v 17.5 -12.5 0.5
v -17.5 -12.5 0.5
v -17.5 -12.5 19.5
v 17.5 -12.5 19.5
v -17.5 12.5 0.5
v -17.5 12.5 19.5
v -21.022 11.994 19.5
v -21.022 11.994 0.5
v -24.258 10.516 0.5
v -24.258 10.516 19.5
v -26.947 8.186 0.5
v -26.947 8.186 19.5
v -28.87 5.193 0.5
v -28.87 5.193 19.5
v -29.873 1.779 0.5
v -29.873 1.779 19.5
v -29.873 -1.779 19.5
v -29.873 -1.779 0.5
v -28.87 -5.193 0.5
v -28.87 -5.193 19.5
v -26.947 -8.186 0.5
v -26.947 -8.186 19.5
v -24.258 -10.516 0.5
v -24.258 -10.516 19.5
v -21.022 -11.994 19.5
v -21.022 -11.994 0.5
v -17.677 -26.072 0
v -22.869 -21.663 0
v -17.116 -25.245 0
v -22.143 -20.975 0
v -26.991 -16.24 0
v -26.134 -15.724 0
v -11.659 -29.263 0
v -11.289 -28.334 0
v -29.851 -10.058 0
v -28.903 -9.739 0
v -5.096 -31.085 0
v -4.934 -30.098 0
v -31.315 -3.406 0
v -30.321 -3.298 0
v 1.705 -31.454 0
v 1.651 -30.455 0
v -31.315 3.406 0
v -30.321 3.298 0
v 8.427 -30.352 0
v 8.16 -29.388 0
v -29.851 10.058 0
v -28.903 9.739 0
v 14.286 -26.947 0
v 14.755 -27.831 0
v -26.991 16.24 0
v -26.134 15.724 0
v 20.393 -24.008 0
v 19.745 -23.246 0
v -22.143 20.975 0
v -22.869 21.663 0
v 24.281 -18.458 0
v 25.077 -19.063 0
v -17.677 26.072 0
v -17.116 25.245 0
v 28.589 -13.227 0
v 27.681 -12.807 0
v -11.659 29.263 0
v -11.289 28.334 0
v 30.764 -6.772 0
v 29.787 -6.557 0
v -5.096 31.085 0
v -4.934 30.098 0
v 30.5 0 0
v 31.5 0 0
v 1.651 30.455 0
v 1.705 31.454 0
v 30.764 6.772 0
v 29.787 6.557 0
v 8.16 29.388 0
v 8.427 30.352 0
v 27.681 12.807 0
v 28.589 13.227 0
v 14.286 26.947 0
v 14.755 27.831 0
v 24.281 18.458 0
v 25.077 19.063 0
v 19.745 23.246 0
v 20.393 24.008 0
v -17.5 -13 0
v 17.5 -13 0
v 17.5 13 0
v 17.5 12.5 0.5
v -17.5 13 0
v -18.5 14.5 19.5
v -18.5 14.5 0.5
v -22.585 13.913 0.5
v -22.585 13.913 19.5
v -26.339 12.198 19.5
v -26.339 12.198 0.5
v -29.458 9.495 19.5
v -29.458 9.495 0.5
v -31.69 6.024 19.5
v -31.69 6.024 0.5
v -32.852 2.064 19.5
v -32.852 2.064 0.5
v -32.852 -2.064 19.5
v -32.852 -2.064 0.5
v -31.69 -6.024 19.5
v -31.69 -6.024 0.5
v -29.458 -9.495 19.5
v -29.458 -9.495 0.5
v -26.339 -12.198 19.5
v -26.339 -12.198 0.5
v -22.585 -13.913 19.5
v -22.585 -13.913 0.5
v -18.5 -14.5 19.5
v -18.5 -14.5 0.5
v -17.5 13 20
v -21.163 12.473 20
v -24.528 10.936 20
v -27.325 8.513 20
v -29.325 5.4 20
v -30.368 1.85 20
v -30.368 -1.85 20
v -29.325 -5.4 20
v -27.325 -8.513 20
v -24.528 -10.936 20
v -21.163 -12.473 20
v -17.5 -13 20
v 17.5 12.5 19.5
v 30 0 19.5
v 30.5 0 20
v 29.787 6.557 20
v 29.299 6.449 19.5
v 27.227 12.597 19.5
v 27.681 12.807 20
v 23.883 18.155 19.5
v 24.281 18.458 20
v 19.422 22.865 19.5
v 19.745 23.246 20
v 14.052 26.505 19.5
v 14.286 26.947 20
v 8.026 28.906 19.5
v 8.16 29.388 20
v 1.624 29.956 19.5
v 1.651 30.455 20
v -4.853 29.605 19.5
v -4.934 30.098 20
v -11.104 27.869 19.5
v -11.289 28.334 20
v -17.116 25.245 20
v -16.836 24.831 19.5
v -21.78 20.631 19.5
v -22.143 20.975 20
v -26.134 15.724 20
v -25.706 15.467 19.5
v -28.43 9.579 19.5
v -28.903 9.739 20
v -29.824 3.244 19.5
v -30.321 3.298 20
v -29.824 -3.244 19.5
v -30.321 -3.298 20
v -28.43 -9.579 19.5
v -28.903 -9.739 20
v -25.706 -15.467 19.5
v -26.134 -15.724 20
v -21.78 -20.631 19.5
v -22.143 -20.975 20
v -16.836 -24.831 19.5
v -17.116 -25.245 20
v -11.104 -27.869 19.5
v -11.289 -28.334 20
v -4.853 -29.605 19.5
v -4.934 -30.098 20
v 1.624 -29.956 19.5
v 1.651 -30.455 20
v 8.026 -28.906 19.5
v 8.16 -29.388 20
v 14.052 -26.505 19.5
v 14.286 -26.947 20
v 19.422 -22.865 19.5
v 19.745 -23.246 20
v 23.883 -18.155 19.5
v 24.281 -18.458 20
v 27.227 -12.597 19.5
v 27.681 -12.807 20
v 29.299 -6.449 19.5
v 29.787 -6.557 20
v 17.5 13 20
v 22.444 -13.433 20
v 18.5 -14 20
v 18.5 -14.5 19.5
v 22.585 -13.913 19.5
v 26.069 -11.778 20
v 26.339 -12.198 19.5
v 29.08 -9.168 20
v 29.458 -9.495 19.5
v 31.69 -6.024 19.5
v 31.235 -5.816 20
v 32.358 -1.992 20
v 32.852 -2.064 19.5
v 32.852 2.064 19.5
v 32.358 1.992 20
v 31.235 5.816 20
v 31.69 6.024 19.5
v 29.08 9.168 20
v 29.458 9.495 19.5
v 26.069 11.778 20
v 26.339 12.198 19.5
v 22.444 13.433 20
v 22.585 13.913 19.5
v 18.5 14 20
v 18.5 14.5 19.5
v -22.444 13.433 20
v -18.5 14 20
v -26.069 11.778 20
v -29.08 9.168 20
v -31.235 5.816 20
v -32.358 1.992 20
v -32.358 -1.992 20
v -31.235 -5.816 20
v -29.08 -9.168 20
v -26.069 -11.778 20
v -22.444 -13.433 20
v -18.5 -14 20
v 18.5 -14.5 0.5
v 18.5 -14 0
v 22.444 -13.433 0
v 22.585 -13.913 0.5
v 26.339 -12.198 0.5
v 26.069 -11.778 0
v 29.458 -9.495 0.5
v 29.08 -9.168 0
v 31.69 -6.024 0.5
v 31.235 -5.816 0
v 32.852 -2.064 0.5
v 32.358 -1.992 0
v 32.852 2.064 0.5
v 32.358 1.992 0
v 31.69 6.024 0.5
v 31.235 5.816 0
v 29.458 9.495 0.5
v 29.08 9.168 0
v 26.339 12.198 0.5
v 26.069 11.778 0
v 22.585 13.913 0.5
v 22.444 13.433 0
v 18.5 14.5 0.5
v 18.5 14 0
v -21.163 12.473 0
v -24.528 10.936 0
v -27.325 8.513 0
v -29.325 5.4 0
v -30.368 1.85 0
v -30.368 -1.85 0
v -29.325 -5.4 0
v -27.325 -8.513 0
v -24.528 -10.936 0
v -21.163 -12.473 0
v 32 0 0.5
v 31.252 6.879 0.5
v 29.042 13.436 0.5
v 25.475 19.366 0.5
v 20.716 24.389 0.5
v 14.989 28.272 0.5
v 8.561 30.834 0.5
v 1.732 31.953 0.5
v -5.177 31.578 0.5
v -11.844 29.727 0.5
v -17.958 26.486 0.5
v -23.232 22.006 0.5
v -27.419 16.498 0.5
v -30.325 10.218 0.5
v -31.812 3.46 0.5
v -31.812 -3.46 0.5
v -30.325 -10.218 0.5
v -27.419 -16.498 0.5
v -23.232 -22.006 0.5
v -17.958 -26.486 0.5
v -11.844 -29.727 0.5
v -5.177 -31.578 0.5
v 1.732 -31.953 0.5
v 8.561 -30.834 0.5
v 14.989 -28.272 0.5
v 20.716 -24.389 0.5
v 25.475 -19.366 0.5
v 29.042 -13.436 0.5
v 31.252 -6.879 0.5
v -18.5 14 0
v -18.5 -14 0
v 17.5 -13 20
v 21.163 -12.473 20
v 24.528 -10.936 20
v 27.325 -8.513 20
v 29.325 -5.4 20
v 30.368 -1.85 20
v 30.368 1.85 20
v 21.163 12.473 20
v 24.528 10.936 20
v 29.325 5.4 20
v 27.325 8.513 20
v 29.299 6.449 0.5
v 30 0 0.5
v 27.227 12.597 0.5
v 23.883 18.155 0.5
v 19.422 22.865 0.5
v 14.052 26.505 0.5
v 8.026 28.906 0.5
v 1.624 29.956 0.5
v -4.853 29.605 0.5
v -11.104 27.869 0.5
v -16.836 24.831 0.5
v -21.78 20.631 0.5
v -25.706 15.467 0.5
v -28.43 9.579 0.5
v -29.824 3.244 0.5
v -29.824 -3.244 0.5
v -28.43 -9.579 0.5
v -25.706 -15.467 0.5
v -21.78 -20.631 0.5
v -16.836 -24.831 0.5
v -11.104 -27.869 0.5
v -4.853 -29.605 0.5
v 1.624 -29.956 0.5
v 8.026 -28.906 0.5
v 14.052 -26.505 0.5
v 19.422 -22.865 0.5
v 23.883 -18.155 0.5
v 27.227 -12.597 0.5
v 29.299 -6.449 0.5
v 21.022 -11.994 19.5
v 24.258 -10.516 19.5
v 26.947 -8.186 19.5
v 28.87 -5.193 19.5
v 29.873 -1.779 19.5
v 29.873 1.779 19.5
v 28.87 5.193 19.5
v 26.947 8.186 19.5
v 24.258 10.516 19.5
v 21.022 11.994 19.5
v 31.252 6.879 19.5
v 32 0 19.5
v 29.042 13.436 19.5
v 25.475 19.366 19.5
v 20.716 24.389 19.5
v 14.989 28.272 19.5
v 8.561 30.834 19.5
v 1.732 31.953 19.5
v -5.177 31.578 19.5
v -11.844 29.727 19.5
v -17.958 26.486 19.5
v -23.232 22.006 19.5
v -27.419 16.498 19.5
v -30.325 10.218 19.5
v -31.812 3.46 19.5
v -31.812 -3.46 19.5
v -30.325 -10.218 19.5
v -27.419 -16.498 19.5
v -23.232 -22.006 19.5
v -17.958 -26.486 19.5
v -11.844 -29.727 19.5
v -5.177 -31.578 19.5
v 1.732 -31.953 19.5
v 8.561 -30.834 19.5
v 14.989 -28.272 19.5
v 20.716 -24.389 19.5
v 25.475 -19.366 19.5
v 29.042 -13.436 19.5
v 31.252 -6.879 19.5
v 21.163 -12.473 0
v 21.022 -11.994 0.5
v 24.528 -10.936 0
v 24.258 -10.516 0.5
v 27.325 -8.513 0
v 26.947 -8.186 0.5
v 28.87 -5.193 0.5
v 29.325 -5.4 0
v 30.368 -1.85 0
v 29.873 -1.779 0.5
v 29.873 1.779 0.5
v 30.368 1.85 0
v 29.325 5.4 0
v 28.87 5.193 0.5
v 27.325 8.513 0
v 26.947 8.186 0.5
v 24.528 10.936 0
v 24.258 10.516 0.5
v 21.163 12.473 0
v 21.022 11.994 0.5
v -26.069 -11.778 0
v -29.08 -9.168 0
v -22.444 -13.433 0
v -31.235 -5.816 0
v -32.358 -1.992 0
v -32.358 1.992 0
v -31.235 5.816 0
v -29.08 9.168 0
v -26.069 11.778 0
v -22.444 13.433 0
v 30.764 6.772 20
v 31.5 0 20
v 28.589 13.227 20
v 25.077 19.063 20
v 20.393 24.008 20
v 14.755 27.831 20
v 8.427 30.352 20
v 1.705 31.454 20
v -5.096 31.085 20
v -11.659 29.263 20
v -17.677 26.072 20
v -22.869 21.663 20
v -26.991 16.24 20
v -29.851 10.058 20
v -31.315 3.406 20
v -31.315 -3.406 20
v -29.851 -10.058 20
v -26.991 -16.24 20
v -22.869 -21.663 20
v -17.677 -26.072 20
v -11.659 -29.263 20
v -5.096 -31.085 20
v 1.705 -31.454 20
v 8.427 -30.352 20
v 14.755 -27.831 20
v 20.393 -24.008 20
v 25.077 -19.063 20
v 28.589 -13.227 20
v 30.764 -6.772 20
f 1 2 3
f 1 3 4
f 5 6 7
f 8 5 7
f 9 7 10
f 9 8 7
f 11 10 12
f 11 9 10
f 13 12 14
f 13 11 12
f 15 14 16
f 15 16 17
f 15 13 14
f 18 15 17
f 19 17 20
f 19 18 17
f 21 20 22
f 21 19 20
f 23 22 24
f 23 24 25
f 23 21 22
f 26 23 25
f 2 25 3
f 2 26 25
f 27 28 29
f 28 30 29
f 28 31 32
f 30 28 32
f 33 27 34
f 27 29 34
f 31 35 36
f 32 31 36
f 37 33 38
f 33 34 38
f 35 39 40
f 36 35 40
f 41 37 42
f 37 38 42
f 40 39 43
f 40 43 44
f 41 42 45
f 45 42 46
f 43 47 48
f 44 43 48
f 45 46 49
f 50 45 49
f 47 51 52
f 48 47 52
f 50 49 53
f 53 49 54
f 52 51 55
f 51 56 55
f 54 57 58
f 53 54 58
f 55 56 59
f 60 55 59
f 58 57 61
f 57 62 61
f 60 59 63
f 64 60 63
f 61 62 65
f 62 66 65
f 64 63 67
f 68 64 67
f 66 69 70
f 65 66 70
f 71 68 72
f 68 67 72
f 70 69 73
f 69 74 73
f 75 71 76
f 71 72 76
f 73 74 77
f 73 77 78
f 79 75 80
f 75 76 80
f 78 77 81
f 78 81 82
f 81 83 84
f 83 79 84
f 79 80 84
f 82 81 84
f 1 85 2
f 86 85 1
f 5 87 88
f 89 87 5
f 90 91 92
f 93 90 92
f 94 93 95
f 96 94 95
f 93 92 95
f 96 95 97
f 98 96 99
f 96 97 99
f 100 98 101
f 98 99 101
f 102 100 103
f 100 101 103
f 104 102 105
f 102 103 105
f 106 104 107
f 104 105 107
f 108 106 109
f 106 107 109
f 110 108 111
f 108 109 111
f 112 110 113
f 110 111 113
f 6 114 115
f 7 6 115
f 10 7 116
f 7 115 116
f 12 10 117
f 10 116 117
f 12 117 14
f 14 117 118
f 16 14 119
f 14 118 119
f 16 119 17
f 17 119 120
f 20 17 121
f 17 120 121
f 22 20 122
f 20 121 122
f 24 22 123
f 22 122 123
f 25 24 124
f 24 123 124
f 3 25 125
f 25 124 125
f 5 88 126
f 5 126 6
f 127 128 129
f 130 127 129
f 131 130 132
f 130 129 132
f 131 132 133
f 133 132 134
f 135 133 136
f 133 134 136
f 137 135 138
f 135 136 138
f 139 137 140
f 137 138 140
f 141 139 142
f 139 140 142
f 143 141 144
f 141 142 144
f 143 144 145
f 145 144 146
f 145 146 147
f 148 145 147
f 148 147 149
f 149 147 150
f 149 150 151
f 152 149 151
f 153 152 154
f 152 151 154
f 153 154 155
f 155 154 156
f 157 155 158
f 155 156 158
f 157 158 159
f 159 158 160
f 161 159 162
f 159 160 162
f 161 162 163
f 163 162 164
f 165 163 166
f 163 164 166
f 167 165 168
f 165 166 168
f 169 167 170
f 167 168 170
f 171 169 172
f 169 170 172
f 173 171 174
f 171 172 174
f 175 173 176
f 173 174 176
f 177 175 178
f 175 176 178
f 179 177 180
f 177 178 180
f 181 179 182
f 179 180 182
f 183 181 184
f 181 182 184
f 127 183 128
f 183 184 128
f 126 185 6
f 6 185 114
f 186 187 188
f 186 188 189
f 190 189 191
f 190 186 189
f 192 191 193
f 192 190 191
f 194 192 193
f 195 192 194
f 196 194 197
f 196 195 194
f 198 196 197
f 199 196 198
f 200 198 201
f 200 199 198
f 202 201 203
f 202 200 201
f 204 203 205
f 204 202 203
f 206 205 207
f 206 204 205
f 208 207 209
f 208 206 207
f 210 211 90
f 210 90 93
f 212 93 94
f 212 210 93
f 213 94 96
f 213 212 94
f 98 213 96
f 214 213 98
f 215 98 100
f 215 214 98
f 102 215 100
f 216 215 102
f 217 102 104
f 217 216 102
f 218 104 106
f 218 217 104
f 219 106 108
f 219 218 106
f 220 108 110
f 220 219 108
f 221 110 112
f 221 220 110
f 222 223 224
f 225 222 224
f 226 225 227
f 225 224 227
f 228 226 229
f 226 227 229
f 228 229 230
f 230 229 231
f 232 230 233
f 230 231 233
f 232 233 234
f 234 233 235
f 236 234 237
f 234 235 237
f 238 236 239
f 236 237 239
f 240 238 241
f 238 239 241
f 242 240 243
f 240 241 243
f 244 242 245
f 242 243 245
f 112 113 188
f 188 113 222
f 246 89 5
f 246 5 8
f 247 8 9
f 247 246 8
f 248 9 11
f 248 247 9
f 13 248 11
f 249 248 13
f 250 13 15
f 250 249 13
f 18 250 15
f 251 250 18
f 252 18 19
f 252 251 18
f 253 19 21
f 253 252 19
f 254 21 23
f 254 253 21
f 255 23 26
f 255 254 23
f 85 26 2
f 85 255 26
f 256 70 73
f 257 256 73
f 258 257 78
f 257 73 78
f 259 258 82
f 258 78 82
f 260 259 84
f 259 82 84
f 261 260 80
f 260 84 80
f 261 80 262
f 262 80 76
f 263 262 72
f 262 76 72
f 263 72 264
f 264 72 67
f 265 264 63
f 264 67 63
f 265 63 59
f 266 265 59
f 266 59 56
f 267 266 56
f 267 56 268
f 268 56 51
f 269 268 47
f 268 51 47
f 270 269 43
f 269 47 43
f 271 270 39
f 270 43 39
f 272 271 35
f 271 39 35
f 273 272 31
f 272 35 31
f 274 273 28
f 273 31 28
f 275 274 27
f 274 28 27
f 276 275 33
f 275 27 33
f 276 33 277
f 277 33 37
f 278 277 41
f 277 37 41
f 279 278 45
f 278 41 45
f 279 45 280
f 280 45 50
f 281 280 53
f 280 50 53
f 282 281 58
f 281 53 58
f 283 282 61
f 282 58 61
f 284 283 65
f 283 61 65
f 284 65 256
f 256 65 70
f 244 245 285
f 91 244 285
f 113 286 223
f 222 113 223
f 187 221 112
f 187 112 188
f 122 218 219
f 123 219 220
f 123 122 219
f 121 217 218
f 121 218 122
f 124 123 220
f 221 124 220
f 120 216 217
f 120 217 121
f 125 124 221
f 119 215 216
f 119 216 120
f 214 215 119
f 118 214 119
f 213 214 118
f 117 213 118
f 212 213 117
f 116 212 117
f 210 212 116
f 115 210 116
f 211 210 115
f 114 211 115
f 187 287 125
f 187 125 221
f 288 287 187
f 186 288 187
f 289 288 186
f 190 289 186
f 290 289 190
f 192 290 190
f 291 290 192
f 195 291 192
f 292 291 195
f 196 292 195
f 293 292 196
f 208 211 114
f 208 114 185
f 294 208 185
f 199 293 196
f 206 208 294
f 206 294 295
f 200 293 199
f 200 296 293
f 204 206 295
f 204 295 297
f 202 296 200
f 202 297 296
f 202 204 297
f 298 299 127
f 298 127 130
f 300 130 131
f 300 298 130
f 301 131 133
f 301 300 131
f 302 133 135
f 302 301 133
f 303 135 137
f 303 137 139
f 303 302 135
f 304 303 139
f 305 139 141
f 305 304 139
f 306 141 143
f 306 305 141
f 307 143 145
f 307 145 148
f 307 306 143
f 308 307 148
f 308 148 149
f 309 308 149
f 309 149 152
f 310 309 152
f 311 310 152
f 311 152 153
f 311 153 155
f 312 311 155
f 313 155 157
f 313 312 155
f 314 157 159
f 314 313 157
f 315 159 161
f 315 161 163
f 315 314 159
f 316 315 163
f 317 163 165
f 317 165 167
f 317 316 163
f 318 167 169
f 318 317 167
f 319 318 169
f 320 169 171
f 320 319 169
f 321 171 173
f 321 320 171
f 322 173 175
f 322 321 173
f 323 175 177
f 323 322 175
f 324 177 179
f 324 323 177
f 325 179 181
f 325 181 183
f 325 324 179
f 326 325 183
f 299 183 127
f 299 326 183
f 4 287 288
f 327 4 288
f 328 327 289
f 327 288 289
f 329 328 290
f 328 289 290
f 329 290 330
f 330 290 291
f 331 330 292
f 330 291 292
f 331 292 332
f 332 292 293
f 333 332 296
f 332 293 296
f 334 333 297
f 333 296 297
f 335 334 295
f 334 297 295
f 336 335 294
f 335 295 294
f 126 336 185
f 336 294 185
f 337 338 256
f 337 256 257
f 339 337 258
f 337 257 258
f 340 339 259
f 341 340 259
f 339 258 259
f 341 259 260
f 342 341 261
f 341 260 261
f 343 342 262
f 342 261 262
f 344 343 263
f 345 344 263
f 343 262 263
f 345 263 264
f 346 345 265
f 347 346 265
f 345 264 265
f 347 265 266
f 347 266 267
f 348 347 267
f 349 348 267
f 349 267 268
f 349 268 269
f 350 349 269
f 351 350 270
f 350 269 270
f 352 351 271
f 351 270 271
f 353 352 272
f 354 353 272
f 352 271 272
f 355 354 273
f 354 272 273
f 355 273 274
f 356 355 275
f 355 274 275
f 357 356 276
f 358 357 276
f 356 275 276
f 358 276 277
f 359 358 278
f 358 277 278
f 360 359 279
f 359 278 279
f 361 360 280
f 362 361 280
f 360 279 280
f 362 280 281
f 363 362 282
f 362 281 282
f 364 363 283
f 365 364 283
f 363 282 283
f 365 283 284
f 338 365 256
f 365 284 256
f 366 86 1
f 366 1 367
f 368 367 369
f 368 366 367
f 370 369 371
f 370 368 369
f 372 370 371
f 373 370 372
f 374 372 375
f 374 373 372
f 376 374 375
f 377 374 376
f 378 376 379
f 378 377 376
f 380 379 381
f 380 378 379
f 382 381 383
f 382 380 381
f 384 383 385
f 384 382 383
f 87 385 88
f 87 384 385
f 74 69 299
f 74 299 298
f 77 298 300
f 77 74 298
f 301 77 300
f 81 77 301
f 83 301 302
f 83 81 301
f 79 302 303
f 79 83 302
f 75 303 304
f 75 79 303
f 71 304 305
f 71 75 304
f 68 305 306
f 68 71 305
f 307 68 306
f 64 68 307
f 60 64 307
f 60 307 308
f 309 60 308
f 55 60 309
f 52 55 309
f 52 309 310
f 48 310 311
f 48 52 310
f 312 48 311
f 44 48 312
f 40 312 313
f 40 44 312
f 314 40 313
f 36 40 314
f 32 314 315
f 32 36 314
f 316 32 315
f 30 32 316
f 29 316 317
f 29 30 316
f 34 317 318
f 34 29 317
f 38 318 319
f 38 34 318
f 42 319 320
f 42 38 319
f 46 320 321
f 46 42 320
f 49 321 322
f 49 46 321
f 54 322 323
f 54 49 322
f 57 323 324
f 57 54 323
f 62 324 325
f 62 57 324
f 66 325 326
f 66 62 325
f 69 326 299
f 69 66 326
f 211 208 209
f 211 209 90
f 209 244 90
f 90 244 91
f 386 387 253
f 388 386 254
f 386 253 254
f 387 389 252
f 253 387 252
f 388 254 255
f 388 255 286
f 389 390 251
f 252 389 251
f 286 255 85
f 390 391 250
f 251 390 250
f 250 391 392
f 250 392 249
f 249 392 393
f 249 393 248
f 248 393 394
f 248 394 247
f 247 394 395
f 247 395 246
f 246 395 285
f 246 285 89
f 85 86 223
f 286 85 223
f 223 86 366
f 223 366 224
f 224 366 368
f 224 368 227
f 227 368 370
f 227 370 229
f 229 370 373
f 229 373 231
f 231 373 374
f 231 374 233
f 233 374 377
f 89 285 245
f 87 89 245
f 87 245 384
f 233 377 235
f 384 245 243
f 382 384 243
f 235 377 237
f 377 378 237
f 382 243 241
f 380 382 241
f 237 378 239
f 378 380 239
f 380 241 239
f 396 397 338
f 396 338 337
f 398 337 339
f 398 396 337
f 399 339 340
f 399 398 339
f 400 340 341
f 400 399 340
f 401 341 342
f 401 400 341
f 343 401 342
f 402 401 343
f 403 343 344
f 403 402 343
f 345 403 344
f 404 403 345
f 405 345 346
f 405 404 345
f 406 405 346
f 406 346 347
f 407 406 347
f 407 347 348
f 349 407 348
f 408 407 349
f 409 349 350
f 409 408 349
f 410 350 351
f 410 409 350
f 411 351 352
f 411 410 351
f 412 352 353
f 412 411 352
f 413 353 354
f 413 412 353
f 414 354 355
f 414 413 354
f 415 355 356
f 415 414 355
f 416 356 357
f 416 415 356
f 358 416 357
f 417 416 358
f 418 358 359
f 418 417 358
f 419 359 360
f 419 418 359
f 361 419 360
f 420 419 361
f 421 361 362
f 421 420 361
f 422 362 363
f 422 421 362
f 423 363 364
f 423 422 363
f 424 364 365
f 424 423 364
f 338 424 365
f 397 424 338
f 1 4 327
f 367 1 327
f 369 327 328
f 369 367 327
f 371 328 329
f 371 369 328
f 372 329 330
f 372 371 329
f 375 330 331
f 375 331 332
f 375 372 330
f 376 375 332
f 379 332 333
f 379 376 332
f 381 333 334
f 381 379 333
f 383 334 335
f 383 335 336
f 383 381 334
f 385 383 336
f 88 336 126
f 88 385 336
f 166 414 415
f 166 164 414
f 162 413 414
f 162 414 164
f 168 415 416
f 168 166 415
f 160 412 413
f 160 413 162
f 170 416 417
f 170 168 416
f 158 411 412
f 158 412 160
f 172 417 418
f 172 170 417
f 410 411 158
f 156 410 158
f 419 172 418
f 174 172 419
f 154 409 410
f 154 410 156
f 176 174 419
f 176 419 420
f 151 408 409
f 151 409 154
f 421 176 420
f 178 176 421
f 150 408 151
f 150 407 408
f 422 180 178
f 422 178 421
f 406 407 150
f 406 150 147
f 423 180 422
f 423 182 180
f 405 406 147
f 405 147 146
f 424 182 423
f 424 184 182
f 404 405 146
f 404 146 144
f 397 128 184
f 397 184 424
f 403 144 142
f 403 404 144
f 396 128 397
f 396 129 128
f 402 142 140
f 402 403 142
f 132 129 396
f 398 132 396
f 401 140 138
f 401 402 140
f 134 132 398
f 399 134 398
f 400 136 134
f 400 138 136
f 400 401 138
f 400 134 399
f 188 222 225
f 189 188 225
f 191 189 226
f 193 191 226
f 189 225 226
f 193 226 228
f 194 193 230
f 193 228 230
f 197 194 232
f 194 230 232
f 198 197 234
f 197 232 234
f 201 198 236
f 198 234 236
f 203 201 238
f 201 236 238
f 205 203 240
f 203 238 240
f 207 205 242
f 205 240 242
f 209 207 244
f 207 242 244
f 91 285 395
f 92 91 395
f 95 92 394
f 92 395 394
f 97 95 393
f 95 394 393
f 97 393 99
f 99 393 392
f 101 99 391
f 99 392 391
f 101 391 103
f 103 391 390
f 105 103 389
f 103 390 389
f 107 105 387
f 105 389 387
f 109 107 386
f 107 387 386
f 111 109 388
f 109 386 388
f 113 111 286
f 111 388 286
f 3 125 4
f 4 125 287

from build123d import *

# Parameters (mm, degrees)
SKETCH_R        = 32
SKETCH_R_2      = 30
PAD_DEPTH       = 20
CHAMFER_SIZE    = 0.5
PAD001_DEPTH    = 20
CHAMFER001_SIZE = 0.5


with BuildPart() as basic_ring:
    # Sketch → Pad (new body)
    with BuildSketch(Plane.XY):
        Circle(SKETCH_R)
        Circle(SKETCH_R_2, mode=Mode.SUBTRACT)
    extrude(amount=PAD_DEPTH)

    # Chamfer
    chamfer_edges = [basic_ring.edges().sort_by_distance(p)[0] for p in [
        (-32, 0, 20),
        (-30, 0, 20),
        (-32, 0, 0),
        (-30, 0, 0),
    ]]
    chamfer(chamfer_edges, length=CHAMFER_SIZE)


with BuildPart() as oblong_ring:
    # Sketch001 → Pad001 (new body)
    with BuildSketch(Plane.XY):
        with BuildLine():
            ThreePointArc((-18.5, 14.5), (-33, 0), (-18.5, -14.5))
            Line((-18.5, -14.5), (18.5, -14.5))
            ThreePointArc((18.5, -14.5), (33, 0), (18.5, 14.5))
            Line((18.5, 14.5), (-18.5, 14.5))
        make_face()
        with BuildLine():
            ThreePointArc((-17.5, 12.5), (-30, 0), (-17.5, -12.5))
            Line((-17.5, -12.5), (17.5, -12.5))
            ThreePointArc((17.5, -12.5), (30, 0), (17.5, 12.5))
            Line((17.5, 12.5), (-17.5, 12.5))
        make_face(mode=Mode.SUBTRACT)
    extrude(amount=PAD001_DEPTH)

    # Chamfer001
    chamfer001_edges = [oblong_ring.edges().sort_by_distance(p)[0] for p in [
        (-33, 0, 0),
        (0, -14.5, 0),
        (33, 0, 0),
        (0, 14.5, 0),
        (-30, 0, 0),
        (0, -12.5, 0),
        (30, 0, 0),
        (0, 12.5, 0),
        (-33, 0, 20),
        (0, -14.5, 20),
        (33, 0, 20),
        (0, 14.5, 20),
        (-30, 0, 20),
        (0, -12.5, 20),
        (30, 0, 20),
        (0, 12.5, 20),
    ]]
    chamfer(chamfer001_edges, length=CHAMFER001_SIZE)


solid = Compound([basic_ring.part, oblong_ring.part])
